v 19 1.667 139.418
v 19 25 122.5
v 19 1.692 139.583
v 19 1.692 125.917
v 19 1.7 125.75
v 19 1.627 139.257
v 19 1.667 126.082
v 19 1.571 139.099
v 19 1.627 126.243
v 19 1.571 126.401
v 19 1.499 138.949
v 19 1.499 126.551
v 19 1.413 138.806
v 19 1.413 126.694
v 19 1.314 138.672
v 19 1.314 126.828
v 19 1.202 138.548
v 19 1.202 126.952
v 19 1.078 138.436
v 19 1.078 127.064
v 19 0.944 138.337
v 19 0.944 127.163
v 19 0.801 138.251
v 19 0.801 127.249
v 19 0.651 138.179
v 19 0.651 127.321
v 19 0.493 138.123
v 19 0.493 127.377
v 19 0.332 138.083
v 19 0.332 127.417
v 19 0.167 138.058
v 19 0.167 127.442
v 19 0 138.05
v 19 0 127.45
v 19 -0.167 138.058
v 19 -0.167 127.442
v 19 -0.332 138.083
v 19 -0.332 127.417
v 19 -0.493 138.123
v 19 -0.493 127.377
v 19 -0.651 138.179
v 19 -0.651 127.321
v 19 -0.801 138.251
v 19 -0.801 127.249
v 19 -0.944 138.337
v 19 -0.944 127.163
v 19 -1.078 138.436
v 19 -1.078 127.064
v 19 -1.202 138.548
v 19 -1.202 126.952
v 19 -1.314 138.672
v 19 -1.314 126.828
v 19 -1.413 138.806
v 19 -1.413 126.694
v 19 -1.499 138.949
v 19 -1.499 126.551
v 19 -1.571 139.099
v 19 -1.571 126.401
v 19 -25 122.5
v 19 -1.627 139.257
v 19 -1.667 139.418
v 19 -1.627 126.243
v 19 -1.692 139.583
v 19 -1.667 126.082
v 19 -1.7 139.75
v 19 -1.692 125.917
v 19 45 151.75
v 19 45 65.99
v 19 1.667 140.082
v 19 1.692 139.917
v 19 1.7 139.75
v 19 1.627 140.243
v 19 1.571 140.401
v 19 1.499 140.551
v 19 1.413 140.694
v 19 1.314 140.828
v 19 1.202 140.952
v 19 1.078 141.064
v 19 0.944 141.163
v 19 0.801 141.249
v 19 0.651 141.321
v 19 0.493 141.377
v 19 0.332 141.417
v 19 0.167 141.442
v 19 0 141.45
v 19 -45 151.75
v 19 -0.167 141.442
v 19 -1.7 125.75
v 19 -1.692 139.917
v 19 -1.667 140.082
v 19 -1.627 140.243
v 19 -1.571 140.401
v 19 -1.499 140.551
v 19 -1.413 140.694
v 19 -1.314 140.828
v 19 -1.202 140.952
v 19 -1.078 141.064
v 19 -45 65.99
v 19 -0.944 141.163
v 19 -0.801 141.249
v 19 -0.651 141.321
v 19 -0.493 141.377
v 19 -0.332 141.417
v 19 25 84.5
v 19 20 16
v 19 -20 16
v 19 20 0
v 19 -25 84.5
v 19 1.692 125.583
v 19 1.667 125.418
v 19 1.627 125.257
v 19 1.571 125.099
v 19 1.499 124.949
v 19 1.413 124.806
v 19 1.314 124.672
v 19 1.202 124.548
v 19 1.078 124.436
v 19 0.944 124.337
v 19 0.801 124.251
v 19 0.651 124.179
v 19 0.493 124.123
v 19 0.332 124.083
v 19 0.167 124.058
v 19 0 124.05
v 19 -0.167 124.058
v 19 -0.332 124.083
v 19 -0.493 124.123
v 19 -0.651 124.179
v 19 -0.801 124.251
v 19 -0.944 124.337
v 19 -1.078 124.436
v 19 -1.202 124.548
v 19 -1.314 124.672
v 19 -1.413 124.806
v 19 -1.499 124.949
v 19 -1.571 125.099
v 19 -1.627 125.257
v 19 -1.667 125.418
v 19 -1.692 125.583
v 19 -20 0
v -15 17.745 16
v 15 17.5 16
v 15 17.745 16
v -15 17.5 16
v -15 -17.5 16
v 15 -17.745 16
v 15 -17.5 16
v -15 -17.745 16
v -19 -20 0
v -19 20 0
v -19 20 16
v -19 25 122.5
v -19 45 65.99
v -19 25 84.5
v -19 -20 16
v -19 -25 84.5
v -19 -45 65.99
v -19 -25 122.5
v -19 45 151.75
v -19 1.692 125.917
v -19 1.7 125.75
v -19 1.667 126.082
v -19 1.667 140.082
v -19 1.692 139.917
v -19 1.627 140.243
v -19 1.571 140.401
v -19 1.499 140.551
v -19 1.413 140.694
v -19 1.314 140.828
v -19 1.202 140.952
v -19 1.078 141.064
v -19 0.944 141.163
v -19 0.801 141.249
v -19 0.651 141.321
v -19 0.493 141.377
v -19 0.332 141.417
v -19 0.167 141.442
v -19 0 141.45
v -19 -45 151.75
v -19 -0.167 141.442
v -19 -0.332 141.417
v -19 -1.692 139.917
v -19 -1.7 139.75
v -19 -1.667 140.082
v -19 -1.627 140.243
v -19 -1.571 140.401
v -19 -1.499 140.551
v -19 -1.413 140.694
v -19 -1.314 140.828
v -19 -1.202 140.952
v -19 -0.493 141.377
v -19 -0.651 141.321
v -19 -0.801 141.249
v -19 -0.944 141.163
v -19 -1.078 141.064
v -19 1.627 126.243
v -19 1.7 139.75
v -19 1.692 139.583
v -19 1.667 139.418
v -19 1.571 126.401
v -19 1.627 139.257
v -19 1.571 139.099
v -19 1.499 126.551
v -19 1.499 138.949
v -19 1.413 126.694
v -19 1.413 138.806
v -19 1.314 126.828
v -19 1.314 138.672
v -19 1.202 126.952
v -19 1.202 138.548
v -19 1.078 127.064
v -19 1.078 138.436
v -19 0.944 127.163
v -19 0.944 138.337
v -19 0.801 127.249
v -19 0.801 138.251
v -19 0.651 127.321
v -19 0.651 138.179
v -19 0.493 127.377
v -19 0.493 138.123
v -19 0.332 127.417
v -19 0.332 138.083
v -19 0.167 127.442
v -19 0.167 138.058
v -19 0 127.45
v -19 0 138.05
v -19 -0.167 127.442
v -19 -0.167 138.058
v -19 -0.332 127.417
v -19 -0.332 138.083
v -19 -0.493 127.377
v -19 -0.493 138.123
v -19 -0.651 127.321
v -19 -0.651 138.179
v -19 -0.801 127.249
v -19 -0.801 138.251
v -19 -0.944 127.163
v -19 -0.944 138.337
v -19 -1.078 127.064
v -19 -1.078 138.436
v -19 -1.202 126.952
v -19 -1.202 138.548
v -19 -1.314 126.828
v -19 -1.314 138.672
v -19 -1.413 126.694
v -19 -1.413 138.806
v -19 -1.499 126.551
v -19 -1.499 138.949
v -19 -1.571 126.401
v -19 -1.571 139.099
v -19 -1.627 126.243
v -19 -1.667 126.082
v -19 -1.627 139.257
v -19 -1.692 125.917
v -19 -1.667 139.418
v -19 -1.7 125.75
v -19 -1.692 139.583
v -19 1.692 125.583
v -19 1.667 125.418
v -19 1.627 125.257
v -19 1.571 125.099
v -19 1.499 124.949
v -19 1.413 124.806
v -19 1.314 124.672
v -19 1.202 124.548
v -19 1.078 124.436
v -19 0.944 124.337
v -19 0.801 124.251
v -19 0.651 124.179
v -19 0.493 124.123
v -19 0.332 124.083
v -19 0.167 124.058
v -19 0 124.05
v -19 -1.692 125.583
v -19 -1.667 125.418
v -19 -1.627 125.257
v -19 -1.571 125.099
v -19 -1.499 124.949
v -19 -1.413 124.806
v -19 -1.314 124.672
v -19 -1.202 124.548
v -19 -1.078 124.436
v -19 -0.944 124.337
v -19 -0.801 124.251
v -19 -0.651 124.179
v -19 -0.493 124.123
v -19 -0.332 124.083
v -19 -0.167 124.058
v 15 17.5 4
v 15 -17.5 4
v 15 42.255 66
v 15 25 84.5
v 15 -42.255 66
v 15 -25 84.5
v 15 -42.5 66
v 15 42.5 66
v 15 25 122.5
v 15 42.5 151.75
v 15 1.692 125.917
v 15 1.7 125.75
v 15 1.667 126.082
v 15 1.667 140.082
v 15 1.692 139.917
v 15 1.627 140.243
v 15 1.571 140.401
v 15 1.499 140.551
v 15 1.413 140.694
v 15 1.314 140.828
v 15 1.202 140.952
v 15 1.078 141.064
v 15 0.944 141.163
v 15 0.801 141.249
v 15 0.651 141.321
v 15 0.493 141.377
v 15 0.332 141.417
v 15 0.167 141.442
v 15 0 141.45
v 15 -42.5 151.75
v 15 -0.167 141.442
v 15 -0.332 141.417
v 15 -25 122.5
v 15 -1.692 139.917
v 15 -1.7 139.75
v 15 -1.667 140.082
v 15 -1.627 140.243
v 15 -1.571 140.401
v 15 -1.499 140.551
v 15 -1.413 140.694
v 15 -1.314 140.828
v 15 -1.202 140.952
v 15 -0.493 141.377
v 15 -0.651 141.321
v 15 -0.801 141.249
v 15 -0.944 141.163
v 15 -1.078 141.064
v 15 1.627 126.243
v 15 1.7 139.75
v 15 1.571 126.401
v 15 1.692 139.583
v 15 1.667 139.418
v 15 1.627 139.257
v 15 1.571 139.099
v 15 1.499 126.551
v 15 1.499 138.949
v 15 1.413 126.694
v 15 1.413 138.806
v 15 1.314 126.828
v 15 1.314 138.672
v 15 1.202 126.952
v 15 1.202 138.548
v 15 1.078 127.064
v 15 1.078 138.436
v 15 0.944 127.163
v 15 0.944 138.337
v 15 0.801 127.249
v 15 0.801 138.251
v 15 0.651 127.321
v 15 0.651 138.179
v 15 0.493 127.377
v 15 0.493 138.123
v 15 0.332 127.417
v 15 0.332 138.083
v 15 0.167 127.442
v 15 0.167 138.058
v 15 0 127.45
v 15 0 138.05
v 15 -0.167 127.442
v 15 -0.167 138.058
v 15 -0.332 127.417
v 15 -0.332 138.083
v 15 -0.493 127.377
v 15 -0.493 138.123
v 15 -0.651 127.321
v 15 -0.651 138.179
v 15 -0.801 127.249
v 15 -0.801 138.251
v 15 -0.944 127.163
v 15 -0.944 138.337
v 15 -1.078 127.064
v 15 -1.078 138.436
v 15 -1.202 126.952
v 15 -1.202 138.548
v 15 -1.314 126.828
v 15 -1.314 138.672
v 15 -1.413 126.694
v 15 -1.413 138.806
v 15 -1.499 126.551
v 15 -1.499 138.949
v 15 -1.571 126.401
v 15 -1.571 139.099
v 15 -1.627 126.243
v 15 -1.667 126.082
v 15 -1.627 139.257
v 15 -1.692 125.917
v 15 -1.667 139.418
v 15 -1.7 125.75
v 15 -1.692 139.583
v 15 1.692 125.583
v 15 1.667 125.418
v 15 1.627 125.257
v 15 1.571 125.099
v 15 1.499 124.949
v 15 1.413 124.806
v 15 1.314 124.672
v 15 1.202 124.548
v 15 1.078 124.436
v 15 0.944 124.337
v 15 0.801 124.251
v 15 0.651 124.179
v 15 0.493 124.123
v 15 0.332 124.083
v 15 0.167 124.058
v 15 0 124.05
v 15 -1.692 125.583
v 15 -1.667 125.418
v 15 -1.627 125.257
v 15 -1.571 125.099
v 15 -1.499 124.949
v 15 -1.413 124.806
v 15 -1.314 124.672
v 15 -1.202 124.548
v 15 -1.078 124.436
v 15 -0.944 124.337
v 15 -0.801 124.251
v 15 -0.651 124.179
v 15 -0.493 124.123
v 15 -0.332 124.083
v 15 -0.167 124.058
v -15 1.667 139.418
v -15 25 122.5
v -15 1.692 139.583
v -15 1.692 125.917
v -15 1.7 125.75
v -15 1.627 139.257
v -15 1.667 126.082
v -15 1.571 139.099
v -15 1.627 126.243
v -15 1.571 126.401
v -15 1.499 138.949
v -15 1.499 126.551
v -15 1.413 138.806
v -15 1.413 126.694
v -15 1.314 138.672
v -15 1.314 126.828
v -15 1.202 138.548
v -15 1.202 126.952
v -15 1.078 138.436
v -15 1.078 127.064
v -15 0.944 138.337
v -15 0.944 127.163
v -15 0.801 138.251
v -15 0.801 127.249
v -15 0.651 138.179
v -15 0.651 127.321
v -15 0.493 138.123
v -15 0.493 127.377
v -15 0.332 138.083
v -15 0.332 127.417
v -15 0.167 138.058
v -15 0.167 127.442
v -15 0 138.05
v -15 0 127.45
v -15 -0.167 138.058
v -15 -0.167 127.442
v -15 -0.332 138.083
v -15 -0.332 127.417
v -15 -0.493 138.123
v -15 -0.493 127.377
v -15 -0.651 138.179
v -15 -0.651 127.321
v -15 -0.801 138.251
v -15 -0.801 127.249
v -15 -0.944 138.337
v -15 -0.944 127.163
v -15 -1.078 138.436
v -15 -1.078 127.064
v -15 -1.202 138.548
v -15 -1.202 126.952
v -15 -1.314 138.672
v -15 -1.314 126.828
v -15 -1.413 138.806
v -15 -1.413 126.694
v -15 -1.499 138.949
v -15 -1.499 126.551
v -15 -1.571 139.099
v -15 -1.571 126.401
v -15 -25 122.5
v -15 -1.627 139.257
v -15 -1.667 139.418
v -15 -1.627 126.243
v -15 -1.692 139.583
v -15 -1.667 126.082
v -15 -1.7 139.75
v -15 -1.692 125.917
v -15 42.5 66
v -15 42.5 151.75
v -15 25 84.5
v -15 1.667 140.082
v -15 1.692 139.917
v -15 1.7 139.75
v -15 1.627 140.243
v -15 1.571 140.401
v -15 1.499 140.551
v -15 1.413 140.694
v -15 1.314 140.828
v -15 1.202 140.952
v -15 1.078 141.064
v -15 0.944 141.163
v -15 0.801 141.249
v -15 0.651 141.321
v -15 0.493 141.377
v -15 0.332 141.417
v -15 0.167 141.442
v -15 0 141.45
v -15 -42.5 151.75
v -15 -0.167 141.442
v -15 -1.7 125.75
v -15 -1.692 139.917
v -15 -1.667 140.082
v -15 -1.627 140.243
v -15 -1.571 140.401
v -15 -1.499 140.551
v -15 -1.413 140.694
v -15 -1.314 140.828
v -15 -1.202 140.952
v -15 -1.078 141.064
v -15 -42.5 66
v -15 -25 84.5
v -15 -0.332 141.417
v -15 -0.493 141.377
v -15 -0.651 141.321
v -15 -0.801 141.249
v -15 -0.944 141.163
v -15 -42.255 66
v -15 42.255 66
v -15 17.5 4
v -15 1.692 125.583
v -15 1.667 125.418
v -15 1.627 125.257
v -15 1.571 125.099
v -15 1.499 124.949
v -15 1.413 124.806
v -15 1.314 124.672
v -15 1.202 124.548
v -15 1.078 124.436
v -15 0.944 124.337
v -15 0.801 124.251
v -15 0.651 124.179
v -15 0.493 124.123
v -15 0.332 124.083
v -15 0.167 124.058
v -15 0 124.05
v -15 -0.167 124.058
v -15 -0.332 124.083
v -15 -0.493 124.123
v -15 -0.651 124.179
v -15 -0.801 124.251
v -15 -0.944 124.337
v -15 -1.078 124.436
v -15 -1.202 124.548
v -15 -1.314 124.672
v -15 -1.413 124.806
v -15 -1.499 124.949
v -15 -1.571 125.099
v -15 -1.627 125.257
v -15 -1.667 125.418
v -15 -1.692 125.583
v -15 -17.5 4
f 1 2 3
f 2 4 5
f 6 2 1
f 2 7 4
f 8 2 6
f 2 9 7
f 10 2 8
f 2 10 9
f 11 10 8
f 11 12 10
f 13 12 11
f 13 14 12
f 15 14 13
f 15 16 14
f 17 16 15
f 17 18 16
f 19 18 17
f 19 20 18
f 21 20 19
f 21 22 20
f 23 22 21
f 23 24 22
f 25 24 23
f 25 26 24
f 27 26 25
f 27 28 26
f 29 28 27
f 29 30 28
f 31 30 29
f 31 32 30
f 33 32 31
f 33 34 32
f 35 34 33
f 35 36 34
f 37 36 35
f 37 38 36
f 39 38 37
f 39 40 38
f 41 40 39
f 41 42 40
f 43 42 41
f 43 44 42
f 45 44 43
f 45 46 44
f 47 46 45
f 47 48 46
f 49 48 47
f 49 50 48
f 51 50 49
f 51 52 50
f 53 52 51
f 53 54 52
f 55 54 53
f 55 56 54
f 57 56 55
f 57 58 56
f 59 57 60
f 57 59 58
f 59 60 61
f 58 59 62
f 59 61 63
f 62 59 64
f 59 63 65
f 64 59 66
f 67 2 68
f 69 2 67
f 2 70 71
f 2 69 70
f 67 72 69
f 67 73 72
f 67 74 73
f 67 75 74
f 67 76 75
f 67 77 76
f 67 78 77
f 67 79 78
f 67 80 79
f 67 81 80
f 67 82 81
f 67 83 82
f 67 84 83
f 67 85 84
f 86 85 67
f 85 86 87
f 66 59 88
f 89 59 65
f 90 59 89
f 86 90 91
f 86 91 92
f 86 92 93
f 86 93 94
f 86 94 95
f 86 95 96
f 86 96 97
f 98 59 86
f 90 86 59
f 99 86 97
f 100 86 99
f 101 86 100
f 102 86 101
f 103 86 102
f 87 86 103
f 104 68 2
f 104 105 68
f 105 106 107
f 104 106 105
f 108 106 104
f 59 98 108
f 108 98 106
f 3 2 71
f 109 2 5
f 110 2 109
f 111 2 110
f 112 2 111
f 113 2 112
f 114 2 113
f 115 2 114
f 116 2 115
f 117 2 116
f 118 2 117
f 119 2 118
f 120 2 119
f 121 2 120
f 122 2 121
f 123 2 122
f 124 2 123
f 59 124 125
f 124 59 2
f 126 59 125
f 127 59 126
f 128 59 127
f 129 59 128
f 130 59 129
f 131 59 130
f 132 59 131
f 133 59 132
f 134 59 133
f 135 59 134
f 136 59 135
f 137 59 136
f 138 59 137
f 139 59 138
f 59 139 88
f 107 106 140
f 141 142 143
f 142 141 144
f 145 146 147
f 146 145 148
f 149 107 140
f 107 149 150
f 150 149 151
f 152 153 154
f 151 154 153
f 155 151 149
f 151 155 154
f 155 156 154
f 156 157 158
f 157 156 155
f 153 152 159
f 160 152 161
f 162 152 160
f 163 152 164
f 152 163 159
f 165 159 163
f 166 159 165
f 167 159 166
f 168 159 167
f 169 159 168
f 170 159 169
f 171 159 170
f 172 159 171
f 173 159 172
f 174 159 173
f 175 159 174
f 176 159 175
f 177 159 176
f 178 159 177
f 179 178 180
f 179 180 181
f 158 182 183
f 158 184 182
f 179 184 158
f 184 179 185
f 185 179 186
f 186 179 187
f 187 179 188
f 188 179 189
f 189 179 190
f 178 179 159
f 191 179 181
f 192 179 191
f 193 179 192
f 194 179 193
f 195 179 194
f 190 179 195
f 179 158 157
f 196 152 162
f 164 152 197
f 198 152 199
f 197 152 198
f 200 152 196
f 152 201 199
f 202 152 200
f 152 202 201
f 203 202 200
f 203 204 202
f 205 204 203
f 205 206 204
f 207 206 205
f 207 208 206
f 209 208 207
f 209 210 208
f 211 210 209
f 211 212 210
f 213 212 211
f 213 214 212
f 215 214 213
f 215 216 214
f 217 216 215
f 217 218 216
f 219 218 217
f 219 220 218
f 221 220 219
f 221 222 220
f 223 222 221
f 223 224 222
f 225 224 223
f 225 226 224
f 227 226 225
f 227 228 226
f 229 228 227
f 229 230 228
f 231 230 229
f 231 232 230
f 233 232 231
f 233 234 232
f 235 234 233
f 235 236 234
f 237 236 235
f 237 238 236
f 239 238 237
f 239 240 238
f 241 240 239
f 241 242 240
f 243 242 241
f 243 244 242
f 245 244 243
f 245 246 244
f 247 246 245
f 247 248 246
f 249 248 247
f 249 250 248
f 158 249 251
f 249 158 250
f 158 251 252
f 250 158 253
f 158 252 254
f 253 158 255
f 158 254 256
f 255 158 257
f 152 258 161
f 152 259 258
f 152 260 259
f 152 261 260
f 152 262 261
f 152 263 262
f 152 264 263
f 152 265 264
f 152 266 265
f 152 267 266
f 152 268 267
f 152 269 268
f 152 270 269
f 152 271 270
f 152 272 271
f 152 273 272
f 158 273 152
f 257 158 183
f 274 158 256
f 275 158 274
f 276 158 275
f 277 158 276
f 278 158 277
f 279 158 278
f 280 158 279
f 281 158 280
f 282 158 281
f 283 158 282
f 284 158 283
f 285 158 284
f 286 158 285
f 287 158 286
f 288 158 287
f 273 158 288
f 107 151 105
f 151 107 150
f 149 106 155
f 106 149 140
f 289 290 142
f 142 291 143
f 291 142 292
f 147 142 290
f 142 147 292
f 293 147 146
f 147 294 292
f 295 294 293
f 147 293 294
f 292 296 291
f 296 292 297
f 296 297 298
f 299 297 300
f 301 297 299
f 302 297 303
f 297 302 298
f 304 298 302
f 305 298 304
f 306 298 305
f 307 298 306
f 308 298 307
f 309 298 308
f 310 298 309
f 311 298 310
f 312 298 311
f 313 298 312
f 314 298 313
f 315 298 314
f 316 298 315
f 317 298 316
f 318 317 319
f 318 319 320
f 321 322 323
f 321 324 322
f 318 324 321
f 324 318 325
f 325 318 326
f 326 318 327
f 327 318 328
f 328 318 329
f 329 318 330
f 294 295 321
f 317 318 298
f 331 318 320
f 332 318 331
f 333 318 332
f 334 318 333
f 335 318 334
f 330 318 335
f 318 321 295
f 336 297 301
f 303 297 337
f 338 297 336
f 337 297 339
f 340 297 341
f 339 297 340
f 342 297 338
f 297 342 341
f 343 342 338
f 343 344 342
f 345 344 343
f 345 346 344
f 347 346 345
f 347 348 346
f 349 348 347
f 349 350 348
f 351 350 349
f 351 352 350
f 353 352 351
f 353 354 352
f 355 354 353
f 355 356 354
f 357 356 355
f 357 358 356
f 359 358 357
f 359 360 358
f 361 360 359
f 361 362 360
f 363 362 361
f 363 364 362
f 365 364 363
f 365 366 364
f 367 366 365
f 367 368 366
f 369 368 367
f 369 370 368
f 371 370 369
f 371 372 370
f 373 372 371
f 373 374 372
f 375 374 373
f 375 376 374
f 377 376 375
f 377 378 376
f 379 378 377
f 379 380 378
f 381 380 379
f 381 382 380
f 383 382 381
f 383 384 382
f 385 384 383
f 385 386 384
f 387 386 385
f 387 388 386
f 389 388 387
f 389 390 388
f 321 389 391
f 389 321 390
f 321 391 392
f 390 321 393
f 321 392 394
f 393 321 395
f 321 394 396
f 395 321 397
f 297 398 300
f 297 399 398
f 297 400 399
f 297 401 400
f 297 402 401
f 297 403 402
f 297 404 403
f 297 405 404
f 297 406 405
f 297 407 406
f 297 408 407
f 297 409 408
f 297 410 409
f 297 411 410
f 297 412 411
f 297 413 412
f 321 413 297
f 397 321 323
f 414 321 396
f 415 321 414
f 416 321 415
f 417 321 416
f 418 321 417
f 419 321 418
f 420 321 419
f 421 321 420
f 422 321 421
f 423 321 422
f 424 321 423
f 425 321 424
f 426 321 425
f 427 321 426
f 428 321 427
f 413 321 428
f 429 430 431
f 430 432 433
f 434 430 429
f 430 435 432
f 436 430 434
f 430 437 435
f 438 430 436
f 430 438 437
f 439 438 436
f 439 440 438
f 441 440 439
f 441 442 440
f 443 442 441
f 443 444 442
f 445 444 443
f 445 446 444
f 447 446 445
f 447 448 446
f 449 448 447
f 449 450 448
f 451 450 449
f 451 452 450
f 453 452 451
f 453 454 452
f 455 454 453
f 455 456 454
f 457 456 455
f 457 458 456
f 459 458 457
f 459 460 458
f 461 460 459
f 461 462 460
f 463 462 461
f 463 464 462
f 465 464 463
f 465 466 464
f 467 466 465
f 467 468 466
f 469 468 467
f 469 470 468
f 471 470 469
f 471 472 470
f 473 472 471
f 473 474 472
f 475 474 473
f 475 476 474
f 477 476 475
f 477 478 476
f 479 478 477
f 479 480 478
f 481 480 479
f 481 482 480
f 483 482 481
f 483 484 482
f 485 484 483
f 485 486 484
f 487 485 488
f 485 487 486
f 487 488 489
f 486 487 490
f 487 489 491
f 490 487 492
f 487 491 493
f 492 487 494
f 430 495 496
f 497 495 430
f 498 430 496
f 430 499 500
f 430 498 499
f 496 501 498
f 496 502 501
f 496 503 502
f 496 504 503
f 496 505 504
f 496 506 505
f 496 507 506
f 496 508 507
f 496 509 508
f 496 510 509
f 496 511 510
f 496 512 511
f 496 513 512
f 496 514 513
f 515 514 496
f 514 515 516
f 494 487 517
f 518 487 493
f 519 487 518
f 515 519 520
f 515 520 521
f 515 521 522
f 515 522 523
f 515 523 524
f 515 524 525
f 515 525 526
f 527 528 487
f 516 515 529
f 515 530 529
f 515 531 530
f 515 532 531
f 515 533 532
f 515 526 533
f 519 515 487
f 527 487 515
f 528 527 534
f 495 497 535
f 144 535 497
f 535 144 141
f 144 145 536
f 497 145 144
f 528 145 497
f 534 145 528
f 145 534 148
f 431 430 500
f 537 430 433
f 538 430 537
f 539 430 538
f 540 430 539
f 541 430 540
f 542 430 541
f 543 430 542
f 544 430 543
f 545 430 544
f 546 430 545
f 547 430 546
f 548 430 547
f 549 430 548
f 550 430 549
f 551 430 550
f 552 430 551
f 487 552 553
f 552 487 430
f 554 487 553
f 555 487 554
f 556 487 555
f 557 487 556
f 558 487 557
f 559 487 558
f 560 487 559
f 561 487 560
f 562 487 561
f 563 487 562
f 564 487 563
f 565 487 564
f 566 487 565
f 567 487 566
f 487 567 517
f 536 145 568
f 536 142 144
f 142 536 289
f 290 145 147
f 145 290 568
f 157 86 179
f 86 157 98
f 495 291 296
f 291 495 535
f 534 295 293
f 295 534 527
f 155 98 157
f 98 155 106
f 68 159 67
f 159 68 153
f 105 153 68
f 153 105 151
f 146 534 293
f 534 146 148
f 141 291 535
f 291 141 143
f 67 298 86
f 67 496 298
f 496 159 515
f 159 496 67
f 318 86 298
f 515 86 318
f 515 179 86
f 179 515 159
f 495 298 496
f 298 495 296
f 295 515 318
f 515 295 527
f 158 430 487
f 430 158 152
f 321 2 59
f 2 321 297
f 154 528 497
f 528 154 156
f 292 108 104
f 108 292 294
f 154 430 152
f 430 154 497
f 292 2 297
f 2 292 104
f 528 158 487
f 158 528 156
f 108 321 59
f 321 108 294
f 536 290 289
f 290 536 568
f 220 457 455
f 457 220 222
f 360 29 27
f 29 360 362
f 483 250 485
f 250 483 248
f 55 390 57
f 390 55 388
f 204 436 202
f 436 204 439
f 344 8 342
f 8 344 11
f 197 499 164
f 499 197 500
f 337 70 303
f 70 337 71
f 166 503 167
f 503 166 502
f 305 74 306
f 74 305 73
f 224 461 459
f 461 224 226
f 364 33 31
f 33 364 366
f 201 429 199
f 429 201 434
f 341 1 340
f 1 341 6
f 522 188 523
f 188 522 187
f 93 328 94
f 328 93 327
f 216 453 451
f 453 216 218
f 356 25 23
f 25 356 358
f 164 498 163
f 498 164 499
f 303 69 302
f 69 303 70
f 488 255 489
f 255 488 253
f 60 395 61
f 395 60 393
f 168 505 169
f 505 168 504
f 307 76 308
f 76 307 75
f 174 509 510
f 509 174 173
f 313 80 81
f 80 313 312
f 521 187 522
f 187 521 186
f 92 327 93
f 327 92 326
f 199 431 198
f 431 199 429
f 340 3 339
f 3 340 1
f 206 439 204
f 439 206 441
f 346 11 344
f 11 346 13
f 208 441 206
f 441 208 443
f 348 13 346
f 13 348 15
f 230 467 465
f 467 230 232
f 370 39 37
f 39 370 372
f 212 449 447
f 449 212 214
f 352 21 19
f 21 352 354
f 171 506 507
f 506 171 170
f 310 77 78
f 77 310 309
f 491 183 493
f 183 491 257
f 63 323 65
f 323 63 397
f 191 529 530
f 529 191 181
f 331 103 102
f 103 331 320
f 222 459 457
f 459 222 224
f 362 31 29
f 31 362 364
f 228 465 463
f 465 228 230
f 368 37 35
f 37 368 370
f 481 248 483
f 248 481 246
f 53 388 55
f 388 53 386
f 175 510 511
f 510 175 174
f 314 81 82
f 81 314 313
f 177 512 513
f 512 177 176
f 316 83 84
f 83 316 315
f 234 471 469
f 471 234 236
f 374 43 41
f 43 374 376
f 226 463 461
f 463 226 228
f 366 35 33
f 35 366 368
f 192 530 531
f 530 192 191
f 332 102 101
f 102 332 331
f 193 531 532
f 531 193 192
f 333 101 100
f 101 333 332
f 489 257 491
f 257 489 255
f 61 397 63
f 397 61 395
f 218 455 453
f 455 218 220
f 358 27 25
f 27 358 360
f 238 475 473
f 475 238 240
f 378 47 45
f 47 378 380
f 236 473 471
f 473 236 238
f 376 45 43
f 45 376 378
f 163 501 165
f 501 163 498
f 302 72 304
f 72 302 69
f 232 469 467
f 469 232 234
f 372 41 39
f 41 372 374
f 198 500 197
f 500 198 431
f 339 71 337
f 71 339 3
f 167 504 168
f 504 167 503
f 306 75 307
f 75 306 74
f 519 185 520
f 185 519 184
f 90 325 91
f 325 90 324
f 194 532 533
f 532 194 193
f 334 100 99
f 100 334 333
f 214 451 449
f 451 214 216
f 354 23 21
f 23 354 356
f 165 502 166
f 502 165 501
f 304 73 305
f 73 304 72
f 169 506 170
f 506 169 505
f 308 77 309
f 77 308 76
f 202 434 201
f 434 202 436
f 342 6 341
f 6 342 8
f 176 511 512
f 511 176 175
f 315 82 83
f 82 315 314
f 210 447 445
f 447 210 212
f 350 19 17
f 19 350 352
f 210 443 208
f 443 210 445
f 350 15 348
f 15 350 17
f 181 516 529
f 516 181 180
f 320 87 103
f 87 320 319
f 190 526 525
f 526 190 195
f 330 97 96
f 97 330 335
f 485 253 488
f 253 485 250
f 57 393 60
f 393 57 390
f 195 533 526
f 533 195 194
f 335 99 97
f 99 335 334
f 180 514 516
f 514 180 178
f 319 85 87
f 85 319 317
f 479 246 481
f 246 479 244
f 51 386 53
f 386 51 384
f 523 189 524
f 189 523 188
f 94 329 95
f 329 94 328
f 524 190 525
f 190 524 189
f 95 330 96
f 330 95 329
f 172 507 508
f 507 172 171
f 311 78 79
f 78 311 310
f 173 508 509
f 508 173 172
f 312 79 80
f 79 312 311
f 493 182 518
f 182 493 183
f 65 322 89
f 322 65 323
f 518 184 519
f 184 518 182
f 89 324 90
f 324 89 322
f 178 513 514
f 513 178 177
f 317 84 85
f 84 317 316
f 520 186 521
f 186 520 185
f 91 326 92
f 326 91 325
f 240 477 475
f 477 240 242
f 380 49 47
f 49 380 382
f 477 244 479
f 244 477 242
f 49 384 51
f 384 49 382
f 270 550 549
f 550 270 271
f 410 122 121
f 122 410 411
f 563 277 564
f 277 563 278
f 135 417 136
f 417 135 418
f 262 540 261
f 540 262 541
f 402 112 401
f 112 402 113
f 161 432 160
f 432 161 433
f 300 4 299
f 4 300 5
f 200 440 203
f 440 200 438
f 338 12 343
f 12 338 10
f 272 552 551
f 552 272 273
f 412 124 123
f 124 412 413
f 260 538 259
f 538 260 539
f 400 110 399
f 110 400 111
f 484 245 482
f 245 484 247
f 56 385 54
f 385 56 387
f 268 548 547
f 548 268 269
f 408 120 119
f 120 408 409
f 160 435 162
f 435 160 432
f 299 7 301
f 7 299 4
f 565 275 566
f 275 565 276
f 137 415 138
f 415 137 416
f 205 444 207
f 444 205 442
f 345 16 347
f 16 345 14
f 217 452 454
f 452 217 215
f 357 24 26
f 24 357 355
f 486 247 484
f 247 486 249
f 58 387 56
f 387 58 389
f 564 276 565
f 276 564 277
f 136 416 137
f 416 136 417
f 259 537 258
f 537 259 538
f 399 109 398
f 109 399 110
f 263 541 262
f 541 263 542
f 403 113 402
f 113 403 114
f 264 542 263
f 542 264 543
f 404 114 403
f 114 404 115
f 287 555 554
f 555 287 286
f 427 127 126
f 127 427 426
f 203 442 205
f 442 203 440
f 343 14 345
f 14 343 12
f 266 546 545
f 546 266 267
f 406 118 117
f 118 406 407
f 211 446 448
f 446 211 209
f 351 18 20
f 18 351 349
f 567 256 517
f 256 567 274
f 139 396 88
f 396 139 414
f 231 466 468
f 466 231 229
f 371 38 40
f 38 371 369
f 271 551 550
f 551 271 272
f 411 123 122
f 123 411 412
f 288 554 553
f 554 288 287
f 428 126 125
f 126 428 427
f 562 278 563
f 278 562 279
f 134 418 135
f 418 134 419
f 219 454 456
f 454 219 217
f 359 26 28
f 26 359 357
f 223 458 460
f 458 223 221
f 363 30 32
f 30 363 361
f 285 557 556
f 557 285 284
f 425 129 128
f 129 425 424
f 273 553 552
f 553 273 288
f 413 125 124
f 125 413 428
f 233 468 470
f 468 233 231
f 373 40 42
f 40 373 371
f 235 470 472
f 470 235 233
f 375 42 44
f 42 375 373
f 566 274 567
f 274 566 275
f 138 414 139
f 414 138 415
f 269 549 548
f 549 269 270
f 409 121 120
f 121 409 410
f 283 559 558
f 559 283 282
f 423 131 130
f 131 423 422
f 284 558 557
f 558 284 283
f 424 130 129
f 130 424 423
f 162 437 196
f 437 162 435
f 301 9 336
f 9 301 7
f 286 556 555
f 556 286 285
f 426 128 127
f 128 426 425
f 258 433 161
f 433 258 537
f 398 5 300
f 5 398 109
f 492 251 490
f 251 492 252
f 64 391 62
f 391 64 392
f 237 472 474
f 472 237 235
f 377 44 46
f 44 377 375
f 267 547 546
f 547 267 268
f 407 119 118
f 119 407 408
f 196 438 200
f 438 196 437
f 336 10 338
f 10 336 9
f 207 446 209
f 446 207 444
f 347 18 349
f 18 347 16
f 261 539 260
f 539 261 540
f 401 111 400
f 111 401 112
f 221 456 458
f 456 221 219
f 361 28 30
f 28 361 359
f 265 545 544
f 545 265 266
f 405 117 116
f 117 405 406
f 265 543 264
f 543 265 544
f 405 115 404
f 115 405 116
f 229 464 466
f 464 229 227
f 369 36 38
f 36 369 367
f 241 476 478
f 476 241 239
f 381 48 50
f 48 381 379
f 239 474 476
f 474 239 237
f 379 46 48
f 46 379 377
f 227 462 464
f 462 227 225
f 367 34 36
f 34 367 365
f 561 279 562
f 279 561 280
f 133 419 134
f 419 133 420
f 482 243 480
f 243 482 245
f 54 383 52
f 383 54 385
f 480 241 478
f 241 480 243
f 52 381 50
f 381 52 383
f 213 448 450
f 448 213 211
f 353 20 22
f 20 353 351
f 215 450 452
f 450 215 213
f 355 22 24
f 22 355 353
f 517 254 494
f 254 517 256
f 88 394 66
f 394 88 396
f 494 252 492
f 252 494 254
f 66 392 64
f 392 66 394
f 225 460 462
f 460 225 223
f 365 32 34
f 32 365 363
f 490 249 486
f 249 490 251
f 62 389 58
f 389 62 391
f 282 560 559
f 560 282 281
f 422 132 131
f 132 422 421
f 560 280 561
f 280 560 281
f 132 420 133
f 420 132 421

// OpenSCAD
// Standalone robot upper body A piece (S101 cap -> splice, taper to 80).
// Edit shared dimensions in frame_v4.scad so the assembly and this part stay linked.
// Print UPRIGHT as placed (~161 tall).

part_mode = "upper_body_a";
part_cutaway = false;     // true removes a corner quarter to inspect the box interior
print_export = true;      // use high quality $fn for STL export

include <frame_master.scad>
